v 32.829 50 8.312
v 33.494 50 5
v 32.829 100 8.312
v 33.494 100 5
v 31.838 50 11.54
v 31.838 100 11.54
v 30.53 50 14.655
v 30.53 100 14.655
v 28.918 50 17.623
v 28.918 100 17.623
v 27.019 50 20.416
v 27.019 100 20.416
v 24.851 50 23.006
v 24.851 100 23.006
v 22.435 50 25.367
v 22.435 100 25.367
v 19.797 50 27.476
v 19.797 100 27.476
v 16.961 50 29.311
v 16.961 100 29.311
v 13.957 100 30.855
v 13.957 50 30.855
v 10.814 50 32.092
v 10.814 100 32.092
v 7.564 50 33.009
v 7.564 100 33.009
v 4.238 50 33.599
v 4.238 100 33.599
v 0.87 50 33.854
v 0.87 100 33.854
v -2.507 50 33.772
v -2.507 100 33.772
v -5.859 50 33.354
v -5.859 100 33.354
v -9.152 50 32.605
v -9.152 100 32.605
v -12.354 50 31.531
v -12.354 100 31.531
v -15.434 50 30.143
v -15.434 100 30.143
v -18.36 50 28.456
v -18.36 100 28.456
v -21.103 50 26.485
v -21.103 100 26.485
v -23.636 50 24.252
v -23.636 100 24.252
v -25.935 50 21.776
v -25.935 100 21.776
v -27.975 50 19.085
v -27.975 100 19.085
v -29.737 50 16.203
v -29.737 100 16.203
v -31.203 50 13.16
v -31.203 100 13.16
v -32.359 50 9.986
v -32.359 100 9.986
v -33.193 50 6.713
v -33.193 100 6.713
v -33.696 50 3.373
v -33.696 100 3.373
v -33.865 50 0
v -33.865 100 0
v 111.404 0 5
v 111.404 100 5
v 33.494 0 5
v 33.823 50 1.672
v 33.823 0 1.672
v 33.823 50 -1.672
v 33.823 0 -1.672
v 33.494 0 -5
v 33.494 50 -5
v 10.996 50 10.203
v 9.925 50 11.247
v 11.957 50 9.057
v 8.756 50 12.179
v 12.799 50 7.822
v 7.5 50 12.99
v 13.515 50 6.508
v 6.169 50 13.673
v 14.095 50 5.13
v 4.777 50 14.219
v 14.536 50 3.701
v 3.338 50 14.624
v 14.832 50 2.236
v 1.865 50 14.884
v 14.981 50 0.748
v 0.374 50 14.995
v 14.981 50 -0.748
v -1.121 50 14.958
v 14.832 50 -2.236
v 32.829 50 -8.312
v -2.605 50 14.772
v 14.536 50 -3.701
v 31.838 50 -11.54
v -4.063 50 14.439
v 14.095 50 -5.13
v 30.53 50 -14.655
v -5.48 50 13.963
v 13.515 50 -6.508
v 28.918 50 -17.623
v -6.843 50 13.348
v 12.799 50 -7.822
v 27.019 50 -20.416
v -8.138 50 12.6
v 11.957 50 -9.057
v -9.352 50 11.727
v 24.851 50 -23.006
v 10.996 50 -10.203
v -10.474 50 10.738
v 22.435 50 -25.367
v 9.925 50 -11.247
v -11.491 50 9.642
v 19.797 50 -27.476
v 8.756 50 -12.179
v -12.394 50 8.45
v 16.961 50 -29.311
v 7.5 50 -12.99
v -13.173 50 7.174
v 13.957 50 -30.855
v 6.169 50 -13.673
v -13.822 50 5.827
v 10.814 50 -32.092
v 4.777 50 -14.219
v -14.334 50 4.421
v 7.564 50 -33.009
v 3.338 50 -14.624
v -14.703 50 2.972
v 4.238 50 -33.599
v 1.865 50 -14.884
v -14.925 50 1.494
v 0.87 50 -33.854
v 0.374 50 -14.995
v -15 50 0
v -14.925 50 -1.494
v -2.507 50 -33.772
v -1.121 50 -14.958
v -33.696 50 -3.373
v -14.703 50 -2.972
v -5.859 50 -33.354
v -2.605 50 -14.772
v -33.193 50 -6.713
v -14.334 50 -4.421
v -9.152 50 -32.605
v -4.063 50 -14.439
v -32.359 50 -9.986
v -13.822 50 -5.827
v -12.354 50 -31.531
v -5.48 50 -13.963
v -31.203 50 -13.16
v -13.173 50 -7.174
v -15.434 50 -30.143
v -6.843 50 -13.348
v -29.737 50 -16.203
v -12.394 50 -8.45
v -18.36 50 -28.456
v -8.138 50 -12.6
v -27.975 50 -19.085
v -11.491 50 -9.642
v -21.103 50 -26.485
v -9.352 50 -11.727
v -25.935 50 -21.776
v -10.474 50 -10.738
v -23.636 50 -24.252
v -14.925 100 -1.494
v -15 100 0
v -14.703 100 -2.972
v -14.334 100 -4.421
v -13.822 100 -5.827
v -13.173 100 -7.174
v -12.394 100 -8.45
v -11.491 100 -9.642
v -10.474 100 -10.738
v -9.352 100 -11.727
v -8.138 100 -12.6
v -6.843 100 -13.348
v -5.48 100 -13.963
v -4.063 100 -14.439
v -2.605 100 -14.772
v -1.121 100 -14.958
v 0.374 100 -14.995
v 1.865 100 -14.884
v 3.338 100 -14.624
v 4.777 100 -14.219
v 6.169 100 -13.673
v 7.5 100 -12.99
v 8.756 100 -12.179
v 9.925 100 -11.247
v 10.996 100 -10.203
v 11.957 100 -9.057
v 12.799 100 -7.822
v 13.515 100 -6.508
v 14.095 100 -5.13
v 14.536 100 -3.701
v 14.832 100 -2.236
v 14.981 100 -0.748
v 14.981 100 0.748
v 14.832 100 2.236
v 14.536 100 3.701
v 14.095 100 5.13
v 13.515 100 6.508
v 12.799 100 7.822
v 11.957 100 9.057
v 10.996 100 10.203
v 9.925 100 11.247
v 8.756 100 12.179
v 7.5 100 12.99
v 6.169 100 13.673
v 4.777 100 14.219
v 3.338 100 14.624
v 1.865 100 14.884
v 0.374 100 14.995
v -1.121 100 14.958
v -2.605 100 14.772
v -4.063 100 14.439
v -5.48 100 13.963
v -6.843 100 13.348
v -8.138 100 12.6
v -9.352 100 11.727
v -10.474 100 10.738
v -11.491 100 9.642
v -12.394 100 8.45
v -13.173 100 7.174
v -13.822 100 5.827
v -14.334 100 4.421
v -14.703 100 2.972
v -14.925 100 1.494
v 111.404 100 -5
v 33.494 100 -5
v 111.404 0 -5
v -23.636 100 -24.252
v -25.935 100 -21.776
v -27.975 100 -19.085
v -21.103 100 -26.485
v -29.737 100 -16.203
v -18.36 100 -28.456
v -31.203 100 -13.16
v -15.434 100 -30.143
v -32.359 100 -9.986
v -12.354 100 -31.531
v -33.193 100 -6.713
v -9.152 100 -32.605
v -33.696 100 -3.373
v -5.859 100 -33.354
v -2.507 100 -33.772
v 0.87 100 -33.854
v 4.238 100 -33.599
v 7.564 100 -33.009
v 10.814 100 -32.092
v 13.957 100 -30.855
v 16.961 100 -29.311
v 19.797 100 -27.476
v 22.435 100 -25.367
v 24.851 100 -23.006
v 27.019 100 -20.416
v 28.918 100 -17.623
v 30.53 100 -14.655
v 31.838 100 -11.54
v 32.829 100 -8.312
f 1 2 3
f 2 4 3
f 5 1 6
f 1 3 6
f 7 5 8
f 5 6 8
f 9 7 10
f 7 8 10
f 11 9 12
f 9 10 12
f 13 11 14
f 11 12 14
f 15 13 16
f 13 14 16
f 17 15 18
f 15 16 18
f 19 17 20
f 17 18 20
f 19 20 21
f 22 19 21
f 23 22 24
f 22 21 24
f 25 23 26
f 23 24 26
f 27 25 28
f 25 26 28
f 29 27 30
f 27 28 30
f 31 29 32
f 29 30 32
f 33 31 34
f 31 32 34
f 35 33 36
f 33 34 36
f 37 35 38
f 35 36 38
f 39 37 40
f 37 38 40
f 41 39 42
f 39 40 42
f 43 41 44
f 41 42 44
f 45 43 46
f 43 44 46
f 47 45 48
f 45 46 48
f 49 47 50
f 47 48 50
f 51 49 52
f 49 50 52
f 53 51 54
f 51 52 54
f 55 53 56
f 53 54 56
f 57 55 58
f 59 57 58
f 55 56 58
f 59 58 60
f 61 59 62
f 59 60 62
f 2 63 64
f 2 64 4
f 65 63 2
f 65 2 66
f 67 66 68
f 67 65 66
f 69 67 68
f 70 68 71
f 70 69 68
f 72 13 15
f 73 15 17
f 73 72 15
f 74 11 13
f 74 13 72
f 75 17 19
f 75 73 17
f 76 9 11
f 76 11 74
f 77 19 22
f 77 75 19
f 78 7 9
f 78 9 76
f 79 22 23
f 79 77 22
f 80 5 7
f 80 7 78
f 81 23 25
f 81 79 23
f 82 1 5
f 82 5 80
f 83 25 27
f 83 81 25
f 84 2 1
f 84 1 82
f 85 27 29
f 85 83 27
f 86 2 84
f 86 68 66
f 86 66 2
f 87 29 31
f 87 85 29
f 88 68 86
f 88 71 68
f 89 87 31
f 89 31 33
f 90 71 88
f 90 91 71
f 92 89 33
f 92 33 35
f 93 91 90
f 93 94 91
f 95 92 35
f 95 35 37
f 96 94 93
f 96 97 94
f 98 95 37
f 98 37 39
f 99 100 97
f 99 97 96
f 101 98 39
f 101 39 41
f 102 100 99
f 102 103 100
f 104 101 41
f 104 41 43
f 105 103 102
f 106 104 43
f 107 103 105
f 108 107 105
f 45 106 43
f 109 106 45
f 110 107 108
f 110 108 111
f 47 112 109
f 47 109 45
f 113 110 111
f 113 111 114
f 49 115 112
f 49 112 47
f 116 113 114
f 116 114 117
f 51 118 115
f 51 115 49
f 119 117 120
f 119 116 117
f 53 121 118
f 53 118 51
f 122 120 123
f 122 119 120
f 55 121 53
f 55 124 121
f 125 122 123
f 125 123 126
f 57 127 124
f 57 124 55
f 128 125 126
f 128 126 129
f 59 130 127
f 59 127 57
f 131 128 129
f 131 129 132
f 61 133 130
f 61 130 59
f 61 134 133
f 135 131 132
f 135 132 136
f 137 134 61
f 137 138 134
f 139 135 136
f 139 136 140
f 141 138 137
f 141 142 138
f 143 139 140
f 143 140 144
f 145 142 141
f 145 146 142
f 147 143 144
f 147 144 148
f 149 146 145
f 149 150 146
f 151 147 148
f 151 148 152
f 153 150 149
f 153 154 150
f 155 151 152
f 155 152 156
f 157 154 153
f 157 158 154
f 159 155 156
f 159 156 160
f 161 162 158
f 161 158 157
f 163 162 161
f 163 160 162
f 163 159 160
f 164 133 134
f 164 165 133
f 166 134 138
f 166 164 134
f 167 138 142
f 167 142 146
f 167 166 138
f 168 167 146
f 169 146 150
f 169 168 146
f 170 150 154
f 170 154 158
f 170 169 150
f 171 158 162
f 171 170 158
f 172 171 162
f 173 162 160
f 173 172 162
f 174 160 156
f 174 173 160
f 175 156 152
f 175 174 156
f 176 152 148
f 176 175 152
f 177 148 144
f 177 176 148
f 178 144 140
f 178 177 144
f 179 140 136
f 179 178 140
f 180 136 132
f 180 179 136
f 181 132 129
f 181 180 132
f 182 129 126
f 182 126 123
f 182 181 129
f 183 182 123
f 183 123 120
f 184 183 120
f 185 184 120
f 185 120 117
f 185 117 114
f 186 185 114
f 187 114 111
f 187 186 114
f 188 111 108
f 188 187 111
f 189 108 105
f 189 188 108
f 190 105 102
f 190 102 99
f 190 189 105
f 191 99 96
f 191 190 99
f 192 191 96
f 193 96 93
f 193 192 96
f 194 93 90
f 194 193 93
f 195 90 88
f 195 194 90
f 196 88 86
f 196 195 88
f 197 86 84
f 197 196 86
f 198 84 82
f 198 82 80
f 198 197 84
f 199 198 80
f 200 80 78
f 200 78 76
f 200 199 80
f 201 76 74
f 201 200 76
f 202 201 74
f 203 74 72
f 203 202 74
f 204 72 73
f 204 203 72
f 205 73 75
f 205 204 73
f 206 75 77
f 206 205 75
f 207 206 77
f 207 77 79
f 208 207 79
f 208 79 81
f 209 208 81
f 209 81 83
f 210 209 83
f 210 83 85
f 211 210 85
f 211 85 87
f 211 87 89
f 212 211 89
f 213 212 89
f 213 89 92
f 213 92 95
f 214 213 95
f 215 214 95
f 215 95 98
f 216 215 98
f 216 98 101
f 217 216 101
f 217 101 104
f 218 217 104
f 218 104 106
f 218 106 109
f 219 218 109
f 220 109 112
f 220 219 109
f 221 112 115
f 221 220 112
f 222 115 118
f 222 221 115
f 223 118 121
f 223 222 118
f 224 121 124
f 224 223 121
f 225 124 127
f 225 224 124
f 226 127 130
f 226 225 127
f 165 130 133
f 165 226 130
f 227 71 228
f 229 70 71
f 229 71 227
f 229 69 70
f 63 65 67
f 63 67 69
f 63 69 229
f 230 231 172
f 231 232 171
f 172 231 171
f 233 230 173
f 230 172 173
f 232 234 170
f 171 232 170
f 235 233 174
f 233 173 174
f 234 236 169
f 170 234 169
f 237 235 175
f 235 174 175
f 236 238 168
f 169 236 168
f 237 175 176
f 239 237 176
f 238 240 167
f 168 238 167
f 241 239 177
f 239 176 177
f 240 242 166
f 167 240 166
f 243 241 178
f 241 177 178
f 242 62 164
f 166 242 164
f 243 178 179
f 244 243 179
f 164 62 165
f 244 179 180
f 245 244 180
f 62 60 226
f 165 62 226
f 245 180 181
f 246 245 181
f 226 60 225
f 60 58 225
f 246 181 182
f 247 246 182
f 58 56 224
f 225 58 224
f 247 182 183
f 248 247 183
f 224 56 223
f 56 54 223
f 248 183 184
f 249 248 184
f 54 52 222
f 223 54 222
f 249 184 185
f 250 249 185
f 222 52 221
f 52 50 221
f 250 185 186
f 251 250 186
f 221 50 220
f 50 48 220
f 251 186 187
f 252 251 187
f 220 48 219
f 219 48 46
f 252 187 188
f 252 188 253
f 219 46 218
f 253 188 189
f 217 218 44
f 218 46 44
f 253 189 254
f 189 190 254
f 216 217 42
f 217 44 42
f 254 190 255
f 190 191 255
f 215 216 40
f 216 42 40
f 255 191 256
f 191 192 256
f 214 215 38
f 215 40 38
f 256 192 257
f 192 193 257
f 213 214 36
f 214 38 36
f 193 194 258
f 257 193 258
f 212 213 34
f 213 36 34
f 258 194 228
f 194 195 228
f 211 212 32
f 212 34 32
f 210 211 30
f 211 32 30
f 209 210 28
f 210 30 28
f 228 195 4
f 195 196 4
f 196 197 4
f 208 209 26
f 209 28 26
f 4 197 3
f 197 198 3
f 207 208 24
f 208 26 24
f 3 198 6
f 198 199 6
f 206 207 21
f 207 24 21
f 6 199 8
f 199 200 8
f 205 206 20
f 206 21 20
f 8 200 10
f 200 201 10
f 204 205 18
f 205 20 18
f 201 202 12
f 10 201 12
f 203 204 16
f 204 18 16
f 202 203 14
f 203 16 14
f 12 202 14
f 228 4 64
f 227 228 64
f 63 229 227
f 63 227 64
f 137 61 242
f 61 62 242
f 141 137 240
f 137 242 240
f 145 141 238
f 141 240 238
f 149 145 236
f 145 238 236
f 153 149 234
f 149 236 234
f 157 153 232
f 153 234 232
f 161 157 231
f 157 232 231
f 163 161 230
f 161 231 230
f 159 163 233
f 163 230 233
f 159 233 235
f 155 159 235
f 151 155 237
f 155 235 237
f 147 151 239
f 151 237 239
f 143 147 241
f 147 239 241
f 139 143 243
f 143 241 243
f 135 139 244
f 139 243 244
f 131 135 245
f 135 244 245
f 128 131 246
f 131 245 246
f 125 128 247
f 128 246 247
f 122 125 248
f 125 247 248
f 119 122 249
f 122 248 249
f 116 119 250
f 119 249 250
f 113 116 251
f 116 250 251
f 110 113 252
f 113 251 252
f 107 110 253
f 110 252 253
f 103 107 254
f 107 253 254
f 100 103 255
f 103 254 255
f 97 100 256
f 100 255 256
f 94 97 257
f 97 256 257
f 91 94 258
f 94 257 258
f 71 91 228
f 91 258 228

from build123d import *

# Parameters (mm, degrees)
F0_W     = 18.864762
F0_H     = 50
F3_DEPTH = 100


with BuildPart() as f1:
    # F0 (on Top) → F1 (revolve)
    with BuildSketch(Plane.XY):
        with Locations((-24.432381, 75)):
            Rectangle(F0_W, F0_H)
    revolve(axis=Axis((0, 34.19238, 0), (0, -1, 0)))

    # F2 (on Front) → F3 (join)
    with BuildSketch(Plane.XZ):
        with BuildLine():
            Line((111.403681, 5), (33.493613, 5))
            ThreePointArc((33.493613, 5), (33.864762, 0), (33.493613, -5))
            Line((33.493613, -5), (111.403681, -5))
            Line((111.403681, -5), (111.403681, 5))
        make_face()
    extrude(amount=-F3_DEPTH)


solid = f1.part
